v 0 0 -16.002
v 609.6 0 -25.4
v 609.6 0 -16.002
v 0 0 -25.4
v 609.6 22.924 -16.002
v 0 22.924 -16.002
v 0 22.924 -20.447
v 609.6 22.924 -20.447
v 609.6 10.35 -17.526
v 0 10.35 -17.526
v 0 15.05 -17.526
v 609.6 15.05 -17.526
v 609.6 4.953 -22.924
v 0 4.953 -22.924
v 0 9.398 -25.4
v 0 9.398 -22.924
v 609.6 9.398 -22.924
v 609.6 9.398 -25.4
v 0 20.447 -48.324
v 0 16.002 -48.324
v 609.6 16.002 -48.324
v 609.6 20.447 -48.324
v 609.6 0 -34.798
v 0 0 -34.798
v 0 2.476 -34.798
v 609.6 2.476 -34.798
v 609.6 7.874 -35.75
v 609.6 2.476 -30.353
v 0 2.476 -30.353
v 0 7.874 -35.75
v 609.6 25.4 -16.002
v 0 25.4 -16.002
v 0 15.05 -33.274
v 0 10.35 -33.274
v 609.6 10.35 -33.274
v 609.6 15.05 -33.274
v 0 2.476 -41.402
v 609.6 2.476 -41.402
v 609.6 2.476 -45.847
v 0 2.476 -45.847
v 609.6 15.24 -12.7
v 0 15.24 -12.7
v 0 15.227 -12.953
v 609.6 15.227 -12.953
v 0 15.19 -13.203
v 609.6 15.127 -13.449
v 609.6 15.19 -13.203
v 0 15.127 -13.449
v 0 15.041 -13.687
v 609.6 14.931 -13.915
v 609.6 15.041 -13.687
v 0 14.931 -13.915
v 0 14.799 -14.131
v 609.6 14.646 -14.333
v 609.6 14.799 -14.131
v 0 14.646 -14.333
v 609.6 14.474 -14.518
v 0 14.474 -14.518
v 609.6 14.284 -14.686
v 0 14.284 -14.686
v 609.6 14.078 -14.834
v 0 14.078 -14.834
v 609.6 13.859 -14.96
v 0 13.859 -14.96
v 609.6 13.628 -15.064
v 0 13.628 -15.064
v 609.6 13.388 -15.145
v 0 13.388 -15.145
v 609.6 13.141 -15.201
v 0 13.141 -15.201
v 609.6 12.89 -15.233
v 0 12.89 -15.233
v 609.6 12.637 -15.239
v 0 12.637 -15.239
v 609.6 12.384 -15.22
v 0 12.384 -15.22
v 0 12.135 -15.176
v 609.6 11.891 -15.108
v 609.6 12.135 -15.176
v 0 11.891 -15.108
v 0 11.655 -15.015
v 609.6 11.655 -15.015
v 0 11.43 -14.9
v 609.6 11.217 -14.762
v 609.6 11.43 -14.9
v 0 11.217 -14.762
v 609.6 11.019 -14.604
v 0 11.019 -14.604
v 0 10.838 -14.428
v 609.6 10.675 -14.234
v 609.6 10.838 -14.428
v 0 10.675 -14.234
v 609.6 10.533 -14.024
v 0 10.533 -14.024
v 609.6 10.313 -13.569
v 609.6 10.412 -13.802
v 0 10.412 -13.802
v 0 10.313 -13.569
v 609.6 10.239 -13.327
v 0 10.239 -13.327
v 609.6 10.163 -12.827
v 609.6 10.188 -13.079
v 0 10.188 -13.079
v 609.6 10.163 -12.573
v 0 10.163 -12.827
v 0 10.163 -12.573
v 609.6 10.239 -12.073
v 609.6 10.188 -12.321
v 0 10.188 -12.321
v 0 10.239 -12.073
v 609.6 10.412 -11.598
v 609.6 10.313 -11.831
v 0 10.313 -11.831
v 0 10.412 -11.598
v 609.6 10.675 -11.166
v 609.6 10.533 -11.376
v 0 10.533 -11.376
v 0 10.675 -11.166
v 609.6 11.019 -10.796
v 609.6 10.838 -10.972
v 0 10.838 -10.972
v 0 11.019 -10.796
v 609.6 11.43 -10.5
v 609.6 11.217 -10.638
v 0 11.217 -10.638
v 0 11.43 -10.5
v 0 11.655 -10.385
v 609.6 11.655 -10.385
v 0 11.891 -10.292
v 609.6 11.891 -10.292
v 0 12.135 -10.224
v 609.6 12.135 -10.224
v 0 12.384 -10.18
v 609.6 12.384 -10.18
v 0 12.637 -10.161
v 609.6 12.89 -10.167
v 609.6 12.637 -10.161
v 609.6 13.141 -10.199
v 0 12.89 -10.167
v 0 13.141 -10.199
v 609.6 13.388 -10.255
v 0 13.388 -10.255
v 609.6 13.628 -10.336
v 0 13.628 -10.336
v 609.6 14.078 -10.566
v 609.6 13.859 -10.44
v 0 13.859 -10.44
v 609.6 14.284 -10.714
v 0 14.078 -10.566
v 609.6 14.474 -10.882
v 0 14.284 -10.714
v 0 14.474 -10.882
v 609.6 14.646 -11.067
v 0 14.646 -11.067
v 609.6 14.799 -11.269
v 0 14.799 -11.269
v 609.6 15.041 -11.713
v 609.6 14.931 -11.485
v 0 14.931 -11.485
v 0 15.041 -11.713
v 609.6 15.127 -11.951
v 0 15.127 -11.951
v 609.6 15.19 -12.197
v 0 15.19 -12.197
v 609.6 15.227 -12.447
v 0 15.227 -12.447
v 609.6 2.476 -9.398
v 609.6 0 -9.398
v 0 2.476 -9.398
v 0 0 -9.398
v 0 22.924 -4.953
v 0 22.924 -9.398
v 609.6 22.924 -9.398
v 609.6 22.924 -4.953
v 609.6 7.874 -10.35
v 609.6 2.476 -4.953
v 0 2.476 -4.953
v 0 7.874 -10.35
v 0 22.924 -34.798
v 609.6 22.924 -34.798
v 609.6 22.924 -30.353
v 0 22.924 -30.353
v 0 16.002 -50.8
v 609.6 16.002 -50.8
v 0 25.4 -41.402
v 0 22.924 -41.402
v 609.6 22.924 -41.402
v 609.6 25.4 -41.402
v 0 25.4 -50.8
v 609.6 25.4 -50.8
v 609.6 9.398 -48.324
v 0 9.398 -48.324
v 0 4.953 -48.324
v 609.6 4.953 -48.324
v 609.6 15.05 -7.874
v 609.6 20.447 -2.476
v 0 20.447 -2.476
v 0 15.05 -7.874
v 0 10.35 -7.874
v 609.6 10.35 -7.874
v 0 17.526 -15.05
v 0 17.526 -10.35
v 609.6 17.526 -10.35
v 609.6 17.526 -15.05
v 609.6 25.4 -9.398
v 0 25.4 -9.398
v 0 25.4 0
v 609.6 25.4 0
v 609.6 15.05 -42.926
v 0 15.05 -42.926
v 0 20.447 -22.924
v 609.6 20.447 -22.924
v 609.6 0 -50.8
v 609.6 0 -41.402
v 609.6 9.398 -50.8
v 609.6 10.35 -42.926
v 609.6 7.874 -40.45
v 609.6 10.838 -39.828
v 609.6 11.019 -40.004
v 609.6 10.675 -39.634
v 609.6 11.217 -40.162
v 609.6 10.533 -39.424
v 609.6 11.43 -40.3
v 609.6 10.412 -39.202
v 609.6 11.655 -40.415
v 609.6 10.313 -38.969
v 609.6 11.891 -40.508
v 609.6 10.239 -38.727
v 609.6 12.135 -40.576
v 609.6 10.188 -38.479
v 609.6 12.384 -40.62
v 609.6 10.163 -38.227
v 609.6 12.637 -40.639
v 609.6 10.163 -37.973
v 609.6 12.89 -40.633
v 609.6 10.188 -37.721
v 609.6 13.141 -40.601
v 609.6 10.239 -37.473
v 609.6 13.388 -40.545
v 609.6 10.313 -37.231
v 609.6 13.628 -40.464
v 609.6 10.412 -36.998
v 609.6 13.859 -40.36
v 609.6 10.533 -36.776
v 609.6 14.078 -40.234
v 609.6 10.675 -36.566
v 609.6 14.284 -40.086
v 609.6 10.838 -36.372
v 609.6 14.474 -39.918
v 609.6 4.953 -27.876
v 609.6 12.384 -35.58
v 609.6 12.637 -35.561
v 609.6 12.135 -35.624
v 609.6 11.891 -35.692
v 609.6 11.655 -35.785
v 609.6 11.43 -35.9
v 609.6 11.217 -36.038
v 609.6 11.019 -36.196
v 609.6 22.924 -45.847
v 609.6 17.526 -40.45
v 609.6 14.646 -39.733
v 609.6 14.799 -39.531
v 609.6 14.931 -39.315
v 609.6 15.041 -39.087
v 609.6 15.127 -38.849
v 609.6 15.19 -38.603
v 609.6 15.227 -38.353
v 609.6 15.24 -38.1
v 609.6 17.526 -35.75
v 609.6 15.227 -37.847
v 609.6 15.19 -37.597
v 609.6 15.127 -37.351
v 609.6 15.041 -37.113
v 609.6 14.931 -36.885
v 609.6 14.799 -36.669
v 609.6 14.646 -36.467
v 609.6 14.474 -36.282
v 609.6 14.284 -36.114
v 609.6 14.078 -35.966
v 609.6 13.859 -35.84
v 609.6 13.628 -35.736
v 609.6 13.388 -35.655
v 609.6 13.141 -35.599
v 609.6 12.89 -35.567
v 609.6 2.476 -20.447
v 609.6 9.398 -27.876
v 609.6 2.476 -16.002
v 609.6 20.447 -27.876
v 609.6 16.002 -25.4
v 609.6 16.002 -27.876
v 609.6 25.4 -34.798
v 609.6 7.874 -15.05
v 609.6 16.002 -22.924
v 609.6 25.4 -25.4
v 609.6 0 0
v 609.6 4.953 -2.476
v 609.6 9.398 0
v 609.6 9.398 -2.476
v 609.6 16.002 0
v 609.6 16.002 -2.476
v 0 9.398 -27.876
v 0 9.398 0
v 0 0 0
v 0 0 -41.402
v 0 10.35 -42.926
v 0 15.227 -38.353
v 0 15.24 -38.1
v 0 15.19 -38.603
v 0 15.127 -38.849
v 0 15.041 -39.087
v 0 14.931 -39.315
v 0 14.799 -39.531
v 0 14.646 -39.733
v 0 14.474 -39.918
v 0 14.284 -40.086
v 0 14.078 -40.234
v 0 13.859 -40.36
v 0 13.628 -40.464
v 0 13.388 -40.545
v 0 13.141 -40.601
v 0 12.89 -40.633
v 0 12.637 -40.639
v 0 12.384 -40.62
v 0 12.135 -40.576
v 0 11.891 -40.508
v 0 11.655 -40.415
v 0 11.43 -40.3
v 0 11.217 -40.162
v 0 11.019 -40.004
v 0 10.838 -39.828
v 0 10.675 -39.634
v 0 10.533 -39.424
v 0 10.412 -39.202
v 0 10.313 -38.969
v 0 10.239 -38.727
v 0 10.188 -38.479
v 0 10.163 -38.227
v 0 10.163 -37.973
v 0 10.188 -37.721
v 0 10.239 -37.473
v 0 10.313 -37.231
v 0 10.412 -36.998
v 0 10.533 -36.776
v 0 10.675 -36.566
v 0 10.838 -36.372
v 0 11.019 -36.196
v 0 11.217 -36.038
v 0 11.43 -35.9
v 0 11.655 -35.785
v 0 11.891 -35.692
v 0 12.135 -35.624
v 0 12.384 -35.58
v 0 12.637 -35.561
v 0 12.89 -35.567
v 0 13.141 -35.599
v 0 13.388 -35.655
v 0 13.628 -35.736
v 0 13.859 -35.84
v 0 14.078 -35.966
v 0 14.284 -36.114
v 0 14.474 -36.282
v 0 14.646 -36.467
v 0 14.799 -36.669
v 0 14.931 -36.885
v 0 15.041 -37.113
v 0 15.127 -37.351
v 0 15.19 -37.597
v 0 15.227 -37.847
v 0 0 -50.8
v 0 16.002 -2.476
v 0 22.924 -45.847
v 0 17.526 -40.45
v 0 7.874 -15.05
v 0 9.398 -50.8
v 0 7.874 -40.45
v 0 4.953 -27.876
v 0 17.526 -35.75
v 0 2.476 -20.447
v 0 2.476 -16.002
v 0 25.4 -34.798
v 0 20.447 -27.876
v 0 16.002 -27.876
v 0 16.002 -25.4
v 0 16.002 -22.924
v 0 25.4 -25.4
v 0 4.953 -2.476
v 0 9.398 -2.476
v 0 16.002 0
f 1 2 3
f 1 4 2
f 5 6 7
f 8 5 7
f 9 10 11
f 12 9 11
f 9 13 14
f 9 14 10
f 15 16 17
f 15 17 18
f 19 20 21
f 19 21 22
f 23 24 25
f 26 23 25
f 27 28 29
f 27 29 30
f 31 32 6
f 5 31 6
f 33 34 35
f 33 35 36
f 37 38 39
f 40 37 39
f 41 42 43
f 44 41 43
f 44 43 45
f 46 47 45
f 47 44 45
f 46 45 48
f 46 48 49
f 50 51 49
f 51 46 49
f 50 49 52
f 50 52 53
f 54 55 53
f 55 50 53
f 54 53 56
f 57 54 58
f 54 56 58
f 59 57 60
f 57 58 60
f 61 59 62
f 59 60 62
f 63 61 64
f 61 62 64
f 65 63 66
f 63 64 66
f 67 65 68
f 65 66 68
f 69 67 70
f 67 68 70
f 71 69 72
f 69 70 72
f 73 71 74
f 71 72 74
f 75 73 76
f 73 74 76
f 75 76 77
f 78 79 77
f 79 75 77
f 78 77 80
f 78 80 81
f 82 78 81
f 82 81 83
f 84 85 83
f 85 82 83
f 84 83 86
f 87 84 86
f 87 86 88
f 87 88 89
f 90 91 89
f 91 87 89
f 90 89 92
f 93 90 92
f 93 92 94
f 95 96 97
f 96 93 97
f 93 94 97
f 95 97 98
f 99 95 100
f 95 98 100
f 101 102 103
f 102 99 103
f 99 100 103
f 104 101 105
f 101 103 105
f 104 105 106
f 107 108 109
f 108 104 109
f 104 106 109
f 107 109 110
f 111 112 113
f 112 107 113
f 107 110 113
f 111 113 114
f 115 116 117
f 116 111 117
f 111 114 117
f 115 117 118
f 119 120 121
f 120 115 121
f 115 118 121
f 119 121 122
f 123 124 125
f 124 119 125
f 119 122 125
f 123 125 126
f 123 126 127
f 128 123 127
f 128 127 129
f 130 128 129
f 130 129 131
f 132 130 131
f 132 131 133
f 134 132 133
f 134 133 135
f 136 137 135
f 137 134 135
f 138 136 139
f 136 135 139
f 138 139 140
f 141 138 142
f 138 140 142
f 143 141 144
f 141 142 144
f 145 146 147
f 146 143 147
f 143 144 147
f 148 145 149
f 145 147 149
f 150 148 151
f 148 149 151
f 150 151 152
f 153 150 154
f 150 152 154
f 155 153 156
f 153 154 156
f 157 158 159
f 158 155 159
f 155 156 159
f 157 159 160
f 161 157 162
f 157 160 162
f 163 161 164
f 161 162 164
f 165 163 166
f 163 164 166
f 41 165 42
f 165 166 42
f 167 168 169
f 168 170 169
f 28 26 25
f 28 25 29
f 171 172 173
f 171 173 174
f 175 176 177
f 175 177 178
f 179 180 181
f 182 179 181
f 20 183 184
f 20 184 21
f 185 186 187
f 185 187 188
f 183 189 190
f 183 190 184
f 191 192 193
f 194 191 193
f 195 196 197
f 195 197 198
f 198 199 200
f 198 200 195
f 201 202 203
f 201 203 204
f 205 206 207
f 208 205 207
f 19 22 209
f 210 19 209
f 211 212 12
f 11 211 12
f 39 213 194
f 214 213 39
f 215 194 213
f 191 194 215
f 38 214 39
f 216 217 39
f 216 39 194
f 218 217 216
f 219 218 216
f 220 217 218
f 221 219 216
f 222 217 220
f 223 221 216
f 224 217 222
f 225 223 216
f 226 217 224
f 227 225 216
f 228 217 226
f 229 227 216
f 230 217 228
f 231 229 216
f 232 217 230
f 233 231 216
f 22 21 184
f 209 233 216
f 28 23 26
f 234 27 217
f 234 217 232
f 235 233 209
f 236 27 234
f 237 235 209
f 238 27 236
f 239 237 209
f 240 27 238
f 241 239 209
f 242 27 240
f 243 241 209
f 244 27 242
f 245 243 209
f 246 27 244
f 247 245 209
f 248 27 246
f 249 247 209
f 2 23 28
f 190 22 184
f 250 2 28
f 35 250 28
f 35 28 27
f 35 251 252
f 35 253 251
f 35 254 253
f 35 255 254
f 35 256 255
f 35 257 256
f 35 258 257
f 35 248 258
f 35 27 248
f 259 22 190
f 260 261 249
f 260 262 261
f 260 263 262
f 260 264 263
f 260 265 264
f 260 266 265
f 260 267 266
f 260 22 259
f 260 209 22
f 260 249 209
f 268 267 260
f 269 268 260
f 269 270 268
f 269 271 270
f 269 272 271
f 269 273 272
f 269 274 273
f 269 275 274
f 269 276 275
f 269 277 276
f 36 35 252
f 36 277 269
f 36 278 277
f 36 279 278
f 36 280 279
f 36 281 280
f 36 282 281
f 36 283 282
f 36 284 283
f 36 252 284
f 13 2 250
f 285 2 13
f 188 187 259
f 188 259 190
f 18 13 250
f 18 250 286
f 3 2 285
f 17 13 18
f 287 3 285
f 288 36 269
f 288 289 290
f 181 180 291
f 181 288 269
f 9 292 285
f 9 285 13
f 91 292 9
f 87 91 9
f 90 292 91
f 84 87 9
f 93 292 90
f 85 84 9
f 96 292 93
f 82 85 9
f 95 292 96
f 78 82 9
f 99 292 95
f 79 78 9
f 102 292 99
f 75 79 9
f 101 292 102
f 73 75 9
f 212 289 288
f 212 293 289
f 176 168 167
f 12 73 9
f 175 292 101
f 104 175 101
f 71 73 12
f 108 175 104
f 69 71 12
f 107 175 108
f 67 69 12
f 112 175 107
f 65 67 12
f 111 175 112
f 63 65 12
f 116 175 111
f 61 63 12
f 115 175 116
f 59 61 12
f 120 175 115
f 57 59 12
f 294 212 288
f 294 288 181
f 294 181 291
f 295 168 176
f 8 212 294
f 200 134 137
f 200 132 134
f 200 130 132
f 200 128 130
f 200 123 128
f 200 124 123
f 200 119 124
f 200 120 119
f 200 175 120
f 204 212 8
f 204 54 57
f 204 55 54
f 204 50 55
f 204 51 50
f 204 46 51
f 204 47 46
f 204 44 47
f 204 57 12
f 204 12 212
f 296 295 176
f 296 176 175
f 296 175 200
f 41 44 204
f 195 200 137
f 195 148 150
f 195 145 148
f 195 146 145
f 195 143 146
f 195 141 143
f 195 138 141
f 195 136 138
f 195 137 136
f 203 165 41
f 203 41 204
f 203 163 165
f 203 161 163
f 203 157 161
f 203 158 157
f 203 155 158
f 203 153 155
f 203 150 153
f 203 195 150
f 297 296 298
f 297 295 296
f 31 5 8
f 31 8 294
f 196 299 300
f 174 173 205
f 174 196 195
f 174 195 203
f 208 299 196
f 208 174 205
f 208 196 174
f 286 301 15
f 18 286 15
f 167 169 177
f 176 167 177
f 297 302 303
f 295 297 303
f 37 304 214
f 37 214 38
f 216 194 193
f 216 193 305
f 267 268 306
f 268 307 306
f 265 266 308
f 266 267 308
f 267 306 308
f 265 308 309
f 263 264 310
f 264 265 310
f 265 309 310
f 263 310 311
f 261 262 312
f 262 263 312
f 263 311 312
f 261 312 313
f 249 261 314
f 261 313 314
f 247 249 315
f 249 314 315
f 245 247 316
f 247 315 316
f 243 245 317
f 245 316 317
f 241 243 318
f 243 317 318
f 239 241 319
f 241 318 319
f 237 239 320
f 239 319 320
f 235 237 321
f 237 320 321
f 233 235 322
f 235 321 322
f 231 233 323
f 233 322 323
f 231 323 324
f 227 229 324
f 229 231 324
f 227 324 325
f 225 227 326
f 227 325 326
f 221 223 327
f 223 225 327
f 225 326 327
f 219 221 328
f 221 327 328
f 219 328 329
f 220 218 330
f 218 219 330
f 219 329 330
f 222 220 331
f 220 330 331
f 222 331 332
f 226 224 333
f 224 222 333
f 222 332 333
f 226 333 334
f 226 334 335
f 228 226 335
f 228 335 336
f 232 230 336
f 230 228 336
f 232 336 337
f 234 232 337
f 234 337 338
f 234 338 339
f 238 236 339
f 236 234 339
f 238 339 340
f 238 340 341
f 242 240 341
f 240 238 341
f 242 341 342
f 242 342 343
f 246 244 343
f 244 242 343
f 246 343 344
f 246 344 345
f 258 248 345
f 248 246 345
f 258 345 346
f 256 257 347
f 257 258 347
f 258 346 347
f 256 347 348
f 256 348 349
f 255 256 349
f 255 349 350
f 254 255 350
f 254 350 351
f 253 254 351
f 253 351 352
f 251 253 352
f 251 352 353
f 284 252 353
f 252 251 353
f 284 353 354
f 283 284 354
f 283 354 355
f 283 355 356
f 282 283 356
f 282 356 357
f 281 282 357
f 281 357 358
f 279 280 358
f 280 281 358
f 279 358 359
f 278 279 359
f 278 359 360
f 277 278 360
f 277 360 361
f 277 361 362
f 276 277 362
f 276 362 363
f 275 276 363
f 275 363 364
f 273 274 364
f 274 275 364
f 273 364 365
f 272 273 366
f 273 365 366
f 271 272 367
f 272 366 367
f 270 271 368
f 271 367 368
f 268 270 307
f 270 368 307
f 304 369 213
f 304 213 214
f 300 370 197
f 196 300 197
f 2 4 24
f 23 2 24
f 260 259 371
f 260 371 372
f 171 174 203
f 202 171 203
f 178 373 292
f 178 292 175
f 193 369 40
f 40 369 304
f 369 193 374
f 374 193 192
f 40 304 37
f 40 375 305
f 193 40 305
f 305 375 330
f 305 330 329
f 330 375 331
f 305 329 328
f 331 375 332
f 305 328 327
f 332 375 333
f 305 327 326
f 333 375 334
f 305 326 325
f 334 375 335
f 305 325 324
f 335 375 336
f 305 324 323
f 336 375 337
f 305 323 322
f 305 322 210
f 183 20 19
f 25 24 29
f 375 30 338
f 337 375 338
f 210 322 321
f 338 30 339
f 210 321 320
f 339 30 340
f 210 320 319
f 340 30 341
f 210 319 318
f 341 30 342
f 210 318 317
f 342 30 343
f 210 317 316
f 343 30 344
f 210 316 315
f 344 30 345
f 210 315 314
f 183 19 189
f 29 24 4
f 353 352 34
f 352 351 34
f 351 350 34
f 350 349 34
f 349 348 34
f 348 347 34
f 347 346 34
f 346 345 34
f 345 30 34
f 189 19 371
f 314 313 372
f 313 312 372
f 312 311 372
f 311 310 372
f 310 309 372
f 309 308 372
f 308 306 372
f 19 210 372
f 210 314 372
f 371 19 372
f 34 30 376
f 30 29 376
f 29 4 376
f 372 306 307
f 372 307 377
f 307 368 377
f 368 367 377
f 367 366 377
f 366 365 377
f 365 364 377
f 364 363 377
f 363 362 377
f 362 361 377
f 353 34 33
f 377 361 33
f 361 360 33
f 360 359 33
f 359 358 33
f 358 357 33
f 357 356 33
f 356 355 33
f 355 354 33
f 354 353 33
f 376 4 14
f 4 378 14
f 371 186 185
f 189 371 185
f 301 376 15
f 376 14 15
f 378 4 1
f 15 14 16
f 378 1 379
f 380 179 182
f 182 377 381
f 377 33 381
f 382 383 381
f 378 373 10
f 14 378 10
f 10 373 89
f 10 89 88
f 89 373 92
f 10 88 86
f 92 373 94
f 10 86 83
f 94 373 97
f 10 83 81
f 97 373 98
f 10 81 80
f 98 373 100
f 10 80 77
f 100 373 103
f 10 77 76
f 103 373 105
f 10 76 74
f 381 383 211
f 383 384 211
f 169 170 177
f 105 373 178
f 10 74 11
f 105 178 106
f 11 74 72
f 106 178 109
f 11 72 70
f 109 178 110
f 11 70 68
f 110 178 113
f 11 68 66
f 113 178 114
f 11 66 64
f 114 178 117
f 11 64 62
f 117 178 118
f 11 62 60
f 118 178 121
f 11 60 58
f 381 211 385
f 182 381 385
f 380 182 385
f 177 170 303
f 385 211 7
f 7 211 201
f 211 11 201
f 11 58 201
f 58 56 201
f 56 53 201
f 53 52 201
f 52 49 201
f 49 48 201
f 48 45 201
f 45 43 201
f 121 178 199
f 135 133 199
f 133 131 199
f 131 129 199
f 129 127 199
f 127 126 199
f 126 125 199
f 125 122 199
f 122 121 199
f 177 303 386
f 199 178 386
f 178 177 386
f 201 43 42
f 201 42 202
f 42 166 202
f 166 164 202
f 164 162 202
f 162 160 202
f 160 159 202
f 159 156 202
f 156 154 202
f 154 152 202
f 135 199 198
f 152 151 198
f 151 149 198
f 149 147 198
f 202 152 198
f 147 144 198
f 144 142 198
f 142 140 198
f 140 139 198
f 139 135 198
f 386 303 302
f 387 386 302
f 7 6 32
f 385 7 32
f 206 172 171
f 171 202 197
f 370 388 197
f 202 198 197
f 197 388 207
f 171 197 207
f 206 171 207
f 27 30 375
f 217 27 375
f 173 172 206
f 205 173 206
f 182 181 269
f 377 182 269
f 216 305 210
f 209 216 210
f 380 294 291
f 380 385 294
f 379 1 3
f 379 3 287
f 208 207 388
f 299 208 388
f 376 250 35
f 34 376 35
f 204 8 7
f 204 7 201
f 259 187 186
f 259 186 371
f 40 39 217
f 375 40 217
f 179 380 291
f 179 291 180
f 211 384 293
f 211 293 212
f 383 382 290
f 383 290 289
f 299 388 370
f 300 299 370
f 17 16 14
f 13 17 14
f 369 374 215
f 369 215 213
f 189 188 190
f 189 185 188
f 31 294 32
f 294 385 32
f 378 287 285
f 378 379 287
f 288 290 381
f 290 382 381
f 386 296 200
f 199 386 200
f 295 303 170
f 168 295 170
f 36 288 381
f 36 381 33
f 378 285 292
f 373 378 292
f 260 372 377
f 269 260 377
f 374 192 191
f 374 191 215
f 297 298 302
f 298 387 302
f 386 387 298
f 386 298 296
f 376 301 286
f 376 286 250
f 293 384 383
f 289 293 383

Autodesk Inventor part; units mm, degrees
ref_plane "YZ Plane" through (0, 0, 0) normal (1, 0, 0) x (0, 1, 0)
ref_plane "XZ Plane" through (0, 0, 0) normal (0, 1, 0) x (-1, 0, 0)
ref_plane "XY Plane" through (0, 0, 0) normal (0, 0, 1) x (1, 0, 0)
sketch "Sketch1" plane through (0, 0, 0) normal (1, 0, 0) x (0, 1, 0)
  line L0 (0, 0) -> (0, -9.398)
  line L1 (0, -9.398) -> (2.4765, -9.398)
  line L2 (9.398, -2.4765) -> (9.398, 0)
  line L3 (9.398, 0) -> (0, 0)
  line L4 (16.002, 0) -> (16.002, -2.4765)
  line L5 (22.9235, -9.398) -> (25.4, -9.398)
  line L6 (25.4, -9.398) -> (25.4, 0)
  line L7 (25.4, 0) -> (16.002, 0)
  line L8 (25.4, -16.002) -> (22.9235, -16.002)
  line L9 (16.002, -22.9235) -> (16.002, -25.4)
  line L10 (25.4, -25.4) -> (25.4, -16.002)
  line L11 (0, -16.002) -> (2.4765, -16.002)
  line L12 (9.398, -22.9235) -> (9.398, -25.4)
  line L13 (0, -25.4) -> (0, -16.002)
  line L14 (22.9235, -9.398) -> (22.9235, -4.953)
  line L15 (16.002, -2.4765) -> (20.447, -2.4765)
  line L16 (20.447, -2.4765) -> (15.0495, -7.874)
  line L17 (20.447, -2.4765) -> (28.0802, -2.4765) construction
  line L18 (22.9235, -4.953) -> (17.526, -10.3505)
  line L19 (22.9235, -16.002) -> (22.9235, -20.447)
  line L20 (22.9235, -20.447) -> (17.526, -15.0495)
  line L21 (16.002, -22.9235) -> (20.447, -22.9235)
  line L22 (20.447, -22.9235) -> (15.0495, -17.526)
  line L23 (2.4765, -16.002) -> (2.4765, -20.447)
  line L24 (2.4765, -20.447) -> (7.874, -15.0495)
  line L25 (9.398, -22.9235) -> (4.953, -22.9235)
  line L26 (4.953, -22.9235) -> (10.3505, -17.526)
  line L27 (9.398, -2.4765) -> (4.953, -2.4765)
  line L28 (4.953, -2.4765) -> (10.3505, -7.874)
  line L29 (2.4765, -9.398) -> (2.4765, -4.953)
  line L30 (2.4765, -4.953) -> (7.874, -10.3505)
  line L31 (10.3505, -7.874) -> (15.0495, -7.874)
  line L32 (17.526, -10.3505) -> (17.526, -15.0495)
  line L33 (10.3505, -17.526) -> (15.0495, -17.526)
  line L34 (7.874, -15.0495) -> (7.874, -10.3505)
  circle A0 centre (12.7, -12.7) radius 2.54
  line L35 (0, -50.8) -> (0, -41.402)
  line L36 (0, -41.402) -> (2.4765, -41.402)
  line L37 (9.398, -48.3235) -> (9.398, -50.8)
  line L38 (9.398, -50.8) -> (0, -50.8)
  line L39 (16.002, -50.8) -> (16.002, -48.3235)
  line L40 (22.9235, -41.402) -> (25.4, -41.402)
  line L41 (25.4, -41.402) -> (25.4, -50.8)
  line L42 (25.4, -50.8) -> (16.002, -50.8)
  line L43 (25.4, -34.798) -> (22.9235, -34.798)
  line L44 (16.002, -27.8765) -> (16.002, -25.4)
  line L45 (25.4, -25.4) -> (25.4, -34.798)
  line L46 (0, -34.798) -> (2.4765, -34.798)
  line L47 (9.398, -27.8765) -> (9.398, -25.4)
  line L48 (0, -25.4) -> (0, -34.798)
  line L49 (22.9235, -41.402) -> (22.9235, -45.847)
  line L50 (16.002, -48.3235) -> (20.447, -48.3235)
  line L51 (20.447, -48.3235) -> (15.0495, -42.926)
  line L52 (20.447, -48.3235) -> (28.0802, -48.3235) construction
  line L53 (22.9235, -45.847) -> (17.526, -40.4495)
  line L54 (22.9235, -34.798) -> (22.9235, -30.353)
  line L55 (22.9235, -30.353) -> (17.526, -35.7505)
  line L56 (16.002, -27.8765) -> (20.447, -27.8765)
  line L57 (20.447, -27.8765) -> (15.0495, -33.274)
  line L58 (2.4765, -34.798) -> (2.4765, -30.353)
  line L59 (2.4765, -30.353) -> (7.874, -35.7505)
  line L60 (9.398, -27.8765) -> (4.953, -27.8765)
  line L61 (4.953, -27.8765) -> (10.3505, -33.274)
  line L62 (9.398, -48.3235) -> (4.953, -48.3235)
  line L63 (4.953, -48.3235) -> (10.3505, -42.926)
  line L64 (2.4765, -41.402) -> (2.4765, -45.847)
  line L65 (2.4765, -45.847) -> (7.874, -40.4495)
  line L66 (10.3505, -42.926) -> (15.0495, -42.926)
  line L67 (17.526, -40.4495) -> (17.526, -35.7505)
  line L68 (10.3505, -33.274) -> (15.0495, -33.274)
  line L69 (7.874, -35.7505) -> (7.874, -40.4495)
  circle A1 centre (12.7, -38.1) radius 2.54
  dimension "d2" = 9.398
  dimension "d3" = 2.4765
  dimension "d7" = 2.4765
  dimension "d10" = 2.4765
  dimension "d11" = 25.4
  dimension "d13" = 2.4765
  dimension "d16" = 2.4765
  dimension "d17" = 9.398
  dimension "d23" = 2.4765
  dimension "d25" = 25.4
  dimension "d32" = 4.445
  dimension "d33" = 4.445
  dimension "d35" = 135
  dimension "d36" = 4.445
  dimension "d37" = 4.445
  dimension "d38" = 2.4765
  dimension "d40" = 4.445
  dimension "d41" = 4.445
  dimension "d42" = 4.445
  dimension "d43" = 4.445
  dimension "d44" = 5.08
extrude "Extrusion1" add sketch "Sketch1" along normal blind 609.6
properties part number "LatX24in1"
